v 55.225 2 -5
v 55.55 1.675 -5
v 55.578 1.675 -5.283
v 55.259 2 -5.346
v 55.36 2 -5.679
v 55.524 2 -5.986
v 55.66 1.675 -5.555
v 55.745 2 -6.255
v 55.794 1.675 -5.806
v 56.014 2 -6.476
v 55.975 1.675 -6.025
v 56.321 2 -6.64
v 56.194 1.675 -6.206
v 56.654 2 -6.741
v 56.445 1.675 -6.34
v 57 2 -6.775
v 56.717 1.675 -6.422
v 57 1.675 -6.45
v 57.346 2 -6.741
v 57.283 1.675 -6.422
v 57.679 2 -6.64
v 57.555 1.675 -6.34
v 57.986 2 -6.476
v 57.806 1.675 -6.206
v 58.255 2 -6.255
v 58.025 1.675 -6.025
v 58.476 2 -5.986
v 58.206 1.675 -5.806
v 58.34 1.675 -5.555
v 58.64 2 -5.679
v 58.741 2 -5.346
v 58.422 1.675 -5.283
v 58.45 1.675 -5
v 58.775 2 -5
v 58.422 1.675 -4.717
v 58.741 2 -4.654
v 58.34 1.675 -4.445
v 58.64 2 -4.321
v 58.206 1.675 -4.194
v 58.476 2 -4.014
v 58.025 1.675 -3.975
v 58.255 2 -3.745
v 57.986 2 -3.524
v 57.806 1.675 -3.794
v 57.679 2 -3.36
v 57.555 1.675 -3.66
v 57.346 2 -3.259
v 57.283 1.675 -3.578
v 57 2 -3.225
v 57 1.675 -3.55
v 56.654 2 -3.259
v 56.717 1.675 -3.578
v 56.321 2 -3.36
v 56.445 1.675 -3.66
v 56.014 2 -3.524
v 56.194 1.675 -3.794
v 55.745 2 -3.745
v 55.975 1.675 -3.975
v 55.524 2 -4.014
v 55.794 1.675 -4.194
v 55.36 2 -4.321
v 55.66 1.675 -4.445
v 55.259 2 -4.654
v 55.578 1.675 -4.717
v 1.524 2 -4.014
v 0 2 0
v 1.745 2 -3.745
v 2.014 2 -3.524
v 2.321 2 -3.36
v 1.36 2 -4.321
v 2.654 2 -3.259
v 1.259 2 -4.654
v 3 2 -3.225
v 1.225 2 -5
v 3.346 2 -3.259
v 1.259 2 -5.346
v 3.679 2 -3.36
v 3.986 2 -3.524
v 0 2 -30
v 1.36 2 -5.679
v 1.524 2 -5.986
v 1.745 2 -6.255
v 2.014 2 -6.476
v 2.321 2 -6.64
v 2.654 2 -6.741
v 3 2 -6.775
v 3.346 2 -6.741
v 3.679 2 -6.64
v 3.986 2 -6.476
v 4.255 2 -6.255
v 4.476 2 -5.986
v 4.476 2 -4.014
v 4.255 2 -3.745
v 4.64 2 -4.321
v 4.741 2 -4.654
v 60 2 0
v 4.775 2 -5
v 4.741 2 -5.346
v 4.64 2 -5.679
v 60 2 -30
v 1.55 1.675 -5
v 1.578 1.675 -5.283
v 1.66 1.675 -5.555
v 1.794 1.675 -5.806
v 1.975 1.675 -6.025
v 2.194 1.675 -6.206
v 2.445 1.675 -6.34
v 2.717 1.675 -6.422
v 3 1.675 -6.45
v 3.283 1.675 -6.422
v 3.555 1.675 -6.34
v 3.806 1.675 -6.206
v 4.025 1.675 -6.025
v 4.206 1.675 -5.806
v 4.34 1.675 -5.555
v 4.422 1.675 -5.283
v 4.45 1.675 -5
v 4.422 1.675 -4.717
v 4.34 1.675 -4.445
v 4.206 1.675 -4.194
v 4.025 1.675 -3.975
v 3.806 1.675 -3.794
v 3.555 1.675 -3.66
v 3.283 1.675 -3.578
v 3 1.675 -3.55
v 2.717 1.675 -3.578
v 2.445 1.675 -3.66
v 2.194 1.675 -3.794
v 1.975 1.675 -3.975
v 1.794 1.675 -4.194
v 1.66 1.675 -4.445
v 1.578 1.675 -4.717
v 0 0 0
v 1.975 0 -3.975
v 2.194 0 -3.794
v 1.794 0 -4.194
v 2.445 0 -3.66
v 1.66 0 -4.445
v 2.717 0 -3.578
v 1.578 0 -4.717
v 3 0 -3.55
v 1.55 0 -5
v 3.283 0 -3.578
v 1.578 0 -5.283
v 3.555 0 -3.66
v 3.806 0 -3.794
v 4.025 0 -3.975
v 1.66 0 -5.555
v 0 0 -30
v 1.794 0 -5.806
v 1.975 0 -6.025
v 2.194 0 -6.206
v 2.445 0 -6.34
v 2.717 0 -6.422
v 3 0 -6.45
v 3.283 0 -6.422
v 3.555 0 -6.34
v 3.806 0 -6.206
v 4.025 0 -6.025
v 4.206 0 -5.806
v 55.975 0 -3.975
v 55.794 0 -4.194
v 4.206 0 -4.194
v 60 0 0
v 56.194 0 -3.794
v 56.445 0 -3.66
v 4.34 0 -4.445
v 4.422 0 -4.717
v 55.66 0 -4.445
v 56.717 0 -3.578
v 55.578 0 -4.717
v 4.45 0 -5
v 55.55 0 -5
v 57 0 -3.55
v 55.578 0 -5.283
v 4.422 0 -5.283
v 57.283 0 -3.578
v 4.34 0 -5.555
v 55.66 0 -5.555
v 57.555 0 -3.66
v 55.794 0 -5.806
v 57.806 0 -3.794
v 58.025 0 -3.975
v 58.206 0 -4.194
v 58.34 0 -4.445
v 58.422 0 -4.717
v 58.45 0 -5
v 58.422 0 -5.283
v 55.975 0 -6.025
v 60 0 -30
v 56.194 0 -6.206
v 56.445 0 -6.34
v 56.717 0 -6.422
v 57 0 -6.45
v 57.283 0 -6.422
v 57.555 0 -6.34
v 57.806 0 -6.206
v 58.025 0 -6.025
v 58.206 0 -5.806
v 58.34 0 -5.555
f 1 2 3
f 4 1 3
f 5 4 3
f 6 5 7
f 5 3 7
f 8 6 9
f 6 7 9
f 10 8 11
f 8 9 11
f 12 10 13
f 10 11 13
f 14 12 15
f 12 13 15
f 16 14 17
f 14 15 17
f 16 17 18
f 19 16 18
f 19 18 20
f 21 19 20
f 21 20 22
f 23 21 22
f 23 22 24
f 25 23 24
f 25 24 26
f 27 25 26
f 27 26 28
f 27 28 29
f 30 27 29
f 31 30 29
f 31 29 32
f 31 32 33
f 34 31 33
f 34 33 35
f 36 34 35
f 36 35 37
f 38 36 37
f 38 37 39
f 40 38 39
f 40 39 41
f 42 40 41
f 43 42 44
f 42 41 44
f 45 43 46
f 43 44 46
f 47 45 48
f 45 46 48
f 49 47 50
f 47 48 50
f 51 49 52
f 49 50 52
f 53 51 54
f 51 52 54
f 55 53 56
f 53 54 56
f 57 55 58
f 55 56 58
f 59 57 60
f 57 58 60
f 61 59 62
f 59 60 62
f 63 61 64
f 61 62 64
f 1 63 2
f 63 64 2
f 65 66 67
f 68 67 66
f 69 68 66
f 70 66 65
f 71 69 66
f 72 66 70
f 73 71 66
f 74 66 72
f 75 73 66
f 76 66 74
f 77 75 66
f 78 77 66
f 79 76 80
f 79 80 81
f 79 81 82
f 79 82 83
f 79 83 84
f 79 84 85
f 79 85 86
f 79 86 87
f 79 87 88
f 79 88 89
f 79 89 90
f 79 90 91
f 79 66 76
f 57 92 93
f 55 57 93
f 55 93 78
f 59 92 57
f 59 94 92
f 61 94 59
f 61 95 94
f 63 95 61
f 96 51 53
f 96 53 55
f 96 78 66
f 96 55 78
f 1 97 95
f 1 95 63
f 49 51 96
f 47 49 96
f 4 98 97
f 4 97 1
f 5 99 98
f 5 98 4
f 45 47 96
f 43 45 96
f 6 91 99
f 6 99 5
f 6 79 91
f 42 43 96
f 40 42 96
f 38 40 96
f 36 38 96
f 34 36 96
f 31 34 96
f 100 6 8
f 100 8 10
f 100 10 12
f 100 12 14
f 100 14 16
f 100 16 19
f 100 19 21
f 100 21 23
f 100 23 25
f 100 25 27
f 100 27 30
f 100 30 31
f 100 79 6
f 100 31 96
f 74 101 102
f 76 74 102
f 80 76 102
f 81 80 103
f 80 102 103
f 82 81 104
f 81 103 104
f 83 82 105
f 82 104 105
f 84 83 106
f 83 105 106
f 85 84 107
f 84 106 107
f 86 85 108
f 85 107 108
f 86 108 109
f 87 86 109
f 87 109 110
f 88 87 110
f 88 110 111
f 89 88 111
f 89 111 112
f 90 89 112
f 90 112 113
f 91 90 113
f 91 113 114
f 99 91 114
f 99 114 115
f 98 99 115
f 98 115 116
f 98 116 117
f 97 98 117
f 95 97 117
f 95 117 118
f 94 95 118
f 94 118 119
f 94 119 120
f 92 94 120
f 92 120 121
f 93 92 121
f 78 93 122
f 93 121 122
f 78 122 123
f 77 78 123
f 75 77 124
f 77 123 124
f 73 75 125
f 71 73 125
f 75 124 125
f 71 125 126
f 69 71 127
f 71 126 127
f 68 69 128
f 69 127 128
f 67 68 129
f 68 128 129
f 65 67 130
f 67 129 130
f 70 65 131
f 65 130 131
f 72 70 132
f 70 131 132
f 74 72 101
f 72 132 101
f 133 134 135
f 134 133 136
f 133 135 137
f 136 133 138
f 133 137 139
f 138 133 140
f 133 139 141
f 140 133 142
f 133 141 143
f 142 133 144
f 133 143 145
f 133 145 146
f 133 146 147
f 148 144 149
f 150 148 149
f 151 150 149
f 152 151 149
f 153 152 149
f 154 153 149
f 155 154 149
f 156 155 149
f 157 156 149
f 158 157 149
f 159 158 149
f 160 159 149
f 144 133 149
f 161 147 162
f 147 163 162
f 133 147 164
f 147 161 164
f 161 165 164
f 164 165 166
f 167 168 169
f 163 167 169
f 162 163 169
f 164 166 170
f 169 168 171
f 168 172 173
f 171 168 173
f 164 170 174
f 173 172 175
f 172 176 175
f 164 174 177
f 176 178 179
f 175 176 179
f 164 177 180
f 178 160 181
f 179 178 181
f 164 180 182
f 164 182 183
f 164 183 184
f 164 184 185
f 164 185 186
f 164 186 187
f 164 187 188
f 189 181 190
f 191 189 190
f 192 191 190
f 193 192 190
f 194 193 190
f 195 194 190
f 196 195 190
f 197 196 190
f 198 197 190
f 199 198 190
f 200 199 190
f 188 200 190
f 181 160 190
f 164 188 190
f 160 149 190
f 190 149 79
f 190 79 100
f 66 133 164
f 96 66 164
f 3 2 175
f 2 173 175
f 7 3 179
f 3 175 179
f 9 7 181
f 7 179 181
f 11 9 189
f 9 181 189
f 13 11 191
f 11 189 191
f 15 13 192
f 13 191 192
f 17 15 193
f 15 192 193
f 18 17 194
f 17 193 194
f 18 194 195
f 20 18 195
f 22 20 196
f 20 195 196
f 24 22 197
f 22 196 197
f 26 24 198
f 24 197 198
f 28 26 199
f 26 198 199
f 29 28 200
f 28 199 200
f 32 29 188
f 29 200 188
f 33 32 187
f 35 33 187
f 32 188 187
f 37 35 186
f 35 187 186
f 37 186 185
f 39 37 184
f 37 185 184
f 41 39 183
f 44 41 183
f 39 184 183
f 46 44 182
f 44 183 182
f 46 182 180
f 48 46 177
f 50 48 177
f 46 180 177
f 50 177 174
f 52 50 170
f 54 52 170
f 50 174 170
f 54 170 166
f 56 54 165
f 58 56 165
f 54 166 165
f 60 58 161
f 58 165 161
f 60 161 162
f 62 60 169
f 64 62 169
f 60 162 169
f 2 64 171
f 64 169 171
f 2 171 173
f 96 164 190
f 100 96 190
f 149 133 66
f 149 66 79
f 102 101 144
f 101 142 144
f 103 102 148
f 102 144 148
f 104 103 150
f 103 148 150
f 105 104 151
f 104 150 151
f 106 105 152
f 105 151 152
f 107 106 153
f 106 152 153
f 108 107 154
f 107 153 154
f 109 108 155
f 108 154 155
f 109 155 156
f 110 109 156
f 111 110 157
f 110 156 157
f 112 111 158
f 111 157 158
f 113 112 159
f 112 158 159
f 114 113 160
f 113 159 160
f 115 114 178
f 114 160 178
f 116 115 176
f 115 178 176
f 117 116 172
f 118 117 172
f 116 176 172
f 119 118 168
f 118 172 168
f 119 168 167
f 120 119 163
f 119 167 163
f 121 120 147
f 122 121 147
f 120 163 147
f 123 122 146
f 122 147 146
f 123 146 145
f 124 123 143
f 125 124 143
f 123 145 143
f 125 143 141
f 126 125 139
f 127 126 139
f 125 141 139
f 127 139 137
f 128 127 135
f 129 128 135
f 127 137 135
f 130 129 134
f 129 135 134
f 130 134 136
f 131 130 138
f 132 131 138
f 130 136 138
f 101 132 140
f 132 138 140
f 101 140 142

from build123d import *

# Parameters (mm, degrees)
SKETCH_1_W                     = 60
SKETCH_1_H                     = 30
EXTRUDE_1_DEPTH                = 2
HOLE_WIZARD_M3_5_1_D           = 2.9
HOLE_WIZARD_M3_5_1_CSINK_D     = 3.55
HOLE_WIZARD_M3_5_1_CSINK_ANGLE = 90


with BuildPart() as part:
    # 草图1 → 凸台-拉伸1 (new body)
    with BuildSketch(Plane(origin=(0, 0, 0), x_dir=(1, 0, 0), z_dir=(0, 1, 0))):
        with Locations((30, 15)):
            Rectangle(SKETCH_1_W, SKETCH_1_H)
    extrude(amount=EXTRUDE_1_DEPTH)

    # M3.5 螺纹孔1 (through all)
    with Locations(Plane(origin=(0, 2, 0), x_dir=(1, 0, 0), z_dir=(0, 1, 0))):
        with Locations((3, 5), (57, 5)):
            CounterSinkHole(HOLE_WIZARD_M3_5_1_D / 2, HOLE_WIZARD_M3_5_1_CSINK_D / 2, counter_sink_angle=HOLE_WIZARD_M3_5_1_CSINK_ANGLE)


solid = part.part
